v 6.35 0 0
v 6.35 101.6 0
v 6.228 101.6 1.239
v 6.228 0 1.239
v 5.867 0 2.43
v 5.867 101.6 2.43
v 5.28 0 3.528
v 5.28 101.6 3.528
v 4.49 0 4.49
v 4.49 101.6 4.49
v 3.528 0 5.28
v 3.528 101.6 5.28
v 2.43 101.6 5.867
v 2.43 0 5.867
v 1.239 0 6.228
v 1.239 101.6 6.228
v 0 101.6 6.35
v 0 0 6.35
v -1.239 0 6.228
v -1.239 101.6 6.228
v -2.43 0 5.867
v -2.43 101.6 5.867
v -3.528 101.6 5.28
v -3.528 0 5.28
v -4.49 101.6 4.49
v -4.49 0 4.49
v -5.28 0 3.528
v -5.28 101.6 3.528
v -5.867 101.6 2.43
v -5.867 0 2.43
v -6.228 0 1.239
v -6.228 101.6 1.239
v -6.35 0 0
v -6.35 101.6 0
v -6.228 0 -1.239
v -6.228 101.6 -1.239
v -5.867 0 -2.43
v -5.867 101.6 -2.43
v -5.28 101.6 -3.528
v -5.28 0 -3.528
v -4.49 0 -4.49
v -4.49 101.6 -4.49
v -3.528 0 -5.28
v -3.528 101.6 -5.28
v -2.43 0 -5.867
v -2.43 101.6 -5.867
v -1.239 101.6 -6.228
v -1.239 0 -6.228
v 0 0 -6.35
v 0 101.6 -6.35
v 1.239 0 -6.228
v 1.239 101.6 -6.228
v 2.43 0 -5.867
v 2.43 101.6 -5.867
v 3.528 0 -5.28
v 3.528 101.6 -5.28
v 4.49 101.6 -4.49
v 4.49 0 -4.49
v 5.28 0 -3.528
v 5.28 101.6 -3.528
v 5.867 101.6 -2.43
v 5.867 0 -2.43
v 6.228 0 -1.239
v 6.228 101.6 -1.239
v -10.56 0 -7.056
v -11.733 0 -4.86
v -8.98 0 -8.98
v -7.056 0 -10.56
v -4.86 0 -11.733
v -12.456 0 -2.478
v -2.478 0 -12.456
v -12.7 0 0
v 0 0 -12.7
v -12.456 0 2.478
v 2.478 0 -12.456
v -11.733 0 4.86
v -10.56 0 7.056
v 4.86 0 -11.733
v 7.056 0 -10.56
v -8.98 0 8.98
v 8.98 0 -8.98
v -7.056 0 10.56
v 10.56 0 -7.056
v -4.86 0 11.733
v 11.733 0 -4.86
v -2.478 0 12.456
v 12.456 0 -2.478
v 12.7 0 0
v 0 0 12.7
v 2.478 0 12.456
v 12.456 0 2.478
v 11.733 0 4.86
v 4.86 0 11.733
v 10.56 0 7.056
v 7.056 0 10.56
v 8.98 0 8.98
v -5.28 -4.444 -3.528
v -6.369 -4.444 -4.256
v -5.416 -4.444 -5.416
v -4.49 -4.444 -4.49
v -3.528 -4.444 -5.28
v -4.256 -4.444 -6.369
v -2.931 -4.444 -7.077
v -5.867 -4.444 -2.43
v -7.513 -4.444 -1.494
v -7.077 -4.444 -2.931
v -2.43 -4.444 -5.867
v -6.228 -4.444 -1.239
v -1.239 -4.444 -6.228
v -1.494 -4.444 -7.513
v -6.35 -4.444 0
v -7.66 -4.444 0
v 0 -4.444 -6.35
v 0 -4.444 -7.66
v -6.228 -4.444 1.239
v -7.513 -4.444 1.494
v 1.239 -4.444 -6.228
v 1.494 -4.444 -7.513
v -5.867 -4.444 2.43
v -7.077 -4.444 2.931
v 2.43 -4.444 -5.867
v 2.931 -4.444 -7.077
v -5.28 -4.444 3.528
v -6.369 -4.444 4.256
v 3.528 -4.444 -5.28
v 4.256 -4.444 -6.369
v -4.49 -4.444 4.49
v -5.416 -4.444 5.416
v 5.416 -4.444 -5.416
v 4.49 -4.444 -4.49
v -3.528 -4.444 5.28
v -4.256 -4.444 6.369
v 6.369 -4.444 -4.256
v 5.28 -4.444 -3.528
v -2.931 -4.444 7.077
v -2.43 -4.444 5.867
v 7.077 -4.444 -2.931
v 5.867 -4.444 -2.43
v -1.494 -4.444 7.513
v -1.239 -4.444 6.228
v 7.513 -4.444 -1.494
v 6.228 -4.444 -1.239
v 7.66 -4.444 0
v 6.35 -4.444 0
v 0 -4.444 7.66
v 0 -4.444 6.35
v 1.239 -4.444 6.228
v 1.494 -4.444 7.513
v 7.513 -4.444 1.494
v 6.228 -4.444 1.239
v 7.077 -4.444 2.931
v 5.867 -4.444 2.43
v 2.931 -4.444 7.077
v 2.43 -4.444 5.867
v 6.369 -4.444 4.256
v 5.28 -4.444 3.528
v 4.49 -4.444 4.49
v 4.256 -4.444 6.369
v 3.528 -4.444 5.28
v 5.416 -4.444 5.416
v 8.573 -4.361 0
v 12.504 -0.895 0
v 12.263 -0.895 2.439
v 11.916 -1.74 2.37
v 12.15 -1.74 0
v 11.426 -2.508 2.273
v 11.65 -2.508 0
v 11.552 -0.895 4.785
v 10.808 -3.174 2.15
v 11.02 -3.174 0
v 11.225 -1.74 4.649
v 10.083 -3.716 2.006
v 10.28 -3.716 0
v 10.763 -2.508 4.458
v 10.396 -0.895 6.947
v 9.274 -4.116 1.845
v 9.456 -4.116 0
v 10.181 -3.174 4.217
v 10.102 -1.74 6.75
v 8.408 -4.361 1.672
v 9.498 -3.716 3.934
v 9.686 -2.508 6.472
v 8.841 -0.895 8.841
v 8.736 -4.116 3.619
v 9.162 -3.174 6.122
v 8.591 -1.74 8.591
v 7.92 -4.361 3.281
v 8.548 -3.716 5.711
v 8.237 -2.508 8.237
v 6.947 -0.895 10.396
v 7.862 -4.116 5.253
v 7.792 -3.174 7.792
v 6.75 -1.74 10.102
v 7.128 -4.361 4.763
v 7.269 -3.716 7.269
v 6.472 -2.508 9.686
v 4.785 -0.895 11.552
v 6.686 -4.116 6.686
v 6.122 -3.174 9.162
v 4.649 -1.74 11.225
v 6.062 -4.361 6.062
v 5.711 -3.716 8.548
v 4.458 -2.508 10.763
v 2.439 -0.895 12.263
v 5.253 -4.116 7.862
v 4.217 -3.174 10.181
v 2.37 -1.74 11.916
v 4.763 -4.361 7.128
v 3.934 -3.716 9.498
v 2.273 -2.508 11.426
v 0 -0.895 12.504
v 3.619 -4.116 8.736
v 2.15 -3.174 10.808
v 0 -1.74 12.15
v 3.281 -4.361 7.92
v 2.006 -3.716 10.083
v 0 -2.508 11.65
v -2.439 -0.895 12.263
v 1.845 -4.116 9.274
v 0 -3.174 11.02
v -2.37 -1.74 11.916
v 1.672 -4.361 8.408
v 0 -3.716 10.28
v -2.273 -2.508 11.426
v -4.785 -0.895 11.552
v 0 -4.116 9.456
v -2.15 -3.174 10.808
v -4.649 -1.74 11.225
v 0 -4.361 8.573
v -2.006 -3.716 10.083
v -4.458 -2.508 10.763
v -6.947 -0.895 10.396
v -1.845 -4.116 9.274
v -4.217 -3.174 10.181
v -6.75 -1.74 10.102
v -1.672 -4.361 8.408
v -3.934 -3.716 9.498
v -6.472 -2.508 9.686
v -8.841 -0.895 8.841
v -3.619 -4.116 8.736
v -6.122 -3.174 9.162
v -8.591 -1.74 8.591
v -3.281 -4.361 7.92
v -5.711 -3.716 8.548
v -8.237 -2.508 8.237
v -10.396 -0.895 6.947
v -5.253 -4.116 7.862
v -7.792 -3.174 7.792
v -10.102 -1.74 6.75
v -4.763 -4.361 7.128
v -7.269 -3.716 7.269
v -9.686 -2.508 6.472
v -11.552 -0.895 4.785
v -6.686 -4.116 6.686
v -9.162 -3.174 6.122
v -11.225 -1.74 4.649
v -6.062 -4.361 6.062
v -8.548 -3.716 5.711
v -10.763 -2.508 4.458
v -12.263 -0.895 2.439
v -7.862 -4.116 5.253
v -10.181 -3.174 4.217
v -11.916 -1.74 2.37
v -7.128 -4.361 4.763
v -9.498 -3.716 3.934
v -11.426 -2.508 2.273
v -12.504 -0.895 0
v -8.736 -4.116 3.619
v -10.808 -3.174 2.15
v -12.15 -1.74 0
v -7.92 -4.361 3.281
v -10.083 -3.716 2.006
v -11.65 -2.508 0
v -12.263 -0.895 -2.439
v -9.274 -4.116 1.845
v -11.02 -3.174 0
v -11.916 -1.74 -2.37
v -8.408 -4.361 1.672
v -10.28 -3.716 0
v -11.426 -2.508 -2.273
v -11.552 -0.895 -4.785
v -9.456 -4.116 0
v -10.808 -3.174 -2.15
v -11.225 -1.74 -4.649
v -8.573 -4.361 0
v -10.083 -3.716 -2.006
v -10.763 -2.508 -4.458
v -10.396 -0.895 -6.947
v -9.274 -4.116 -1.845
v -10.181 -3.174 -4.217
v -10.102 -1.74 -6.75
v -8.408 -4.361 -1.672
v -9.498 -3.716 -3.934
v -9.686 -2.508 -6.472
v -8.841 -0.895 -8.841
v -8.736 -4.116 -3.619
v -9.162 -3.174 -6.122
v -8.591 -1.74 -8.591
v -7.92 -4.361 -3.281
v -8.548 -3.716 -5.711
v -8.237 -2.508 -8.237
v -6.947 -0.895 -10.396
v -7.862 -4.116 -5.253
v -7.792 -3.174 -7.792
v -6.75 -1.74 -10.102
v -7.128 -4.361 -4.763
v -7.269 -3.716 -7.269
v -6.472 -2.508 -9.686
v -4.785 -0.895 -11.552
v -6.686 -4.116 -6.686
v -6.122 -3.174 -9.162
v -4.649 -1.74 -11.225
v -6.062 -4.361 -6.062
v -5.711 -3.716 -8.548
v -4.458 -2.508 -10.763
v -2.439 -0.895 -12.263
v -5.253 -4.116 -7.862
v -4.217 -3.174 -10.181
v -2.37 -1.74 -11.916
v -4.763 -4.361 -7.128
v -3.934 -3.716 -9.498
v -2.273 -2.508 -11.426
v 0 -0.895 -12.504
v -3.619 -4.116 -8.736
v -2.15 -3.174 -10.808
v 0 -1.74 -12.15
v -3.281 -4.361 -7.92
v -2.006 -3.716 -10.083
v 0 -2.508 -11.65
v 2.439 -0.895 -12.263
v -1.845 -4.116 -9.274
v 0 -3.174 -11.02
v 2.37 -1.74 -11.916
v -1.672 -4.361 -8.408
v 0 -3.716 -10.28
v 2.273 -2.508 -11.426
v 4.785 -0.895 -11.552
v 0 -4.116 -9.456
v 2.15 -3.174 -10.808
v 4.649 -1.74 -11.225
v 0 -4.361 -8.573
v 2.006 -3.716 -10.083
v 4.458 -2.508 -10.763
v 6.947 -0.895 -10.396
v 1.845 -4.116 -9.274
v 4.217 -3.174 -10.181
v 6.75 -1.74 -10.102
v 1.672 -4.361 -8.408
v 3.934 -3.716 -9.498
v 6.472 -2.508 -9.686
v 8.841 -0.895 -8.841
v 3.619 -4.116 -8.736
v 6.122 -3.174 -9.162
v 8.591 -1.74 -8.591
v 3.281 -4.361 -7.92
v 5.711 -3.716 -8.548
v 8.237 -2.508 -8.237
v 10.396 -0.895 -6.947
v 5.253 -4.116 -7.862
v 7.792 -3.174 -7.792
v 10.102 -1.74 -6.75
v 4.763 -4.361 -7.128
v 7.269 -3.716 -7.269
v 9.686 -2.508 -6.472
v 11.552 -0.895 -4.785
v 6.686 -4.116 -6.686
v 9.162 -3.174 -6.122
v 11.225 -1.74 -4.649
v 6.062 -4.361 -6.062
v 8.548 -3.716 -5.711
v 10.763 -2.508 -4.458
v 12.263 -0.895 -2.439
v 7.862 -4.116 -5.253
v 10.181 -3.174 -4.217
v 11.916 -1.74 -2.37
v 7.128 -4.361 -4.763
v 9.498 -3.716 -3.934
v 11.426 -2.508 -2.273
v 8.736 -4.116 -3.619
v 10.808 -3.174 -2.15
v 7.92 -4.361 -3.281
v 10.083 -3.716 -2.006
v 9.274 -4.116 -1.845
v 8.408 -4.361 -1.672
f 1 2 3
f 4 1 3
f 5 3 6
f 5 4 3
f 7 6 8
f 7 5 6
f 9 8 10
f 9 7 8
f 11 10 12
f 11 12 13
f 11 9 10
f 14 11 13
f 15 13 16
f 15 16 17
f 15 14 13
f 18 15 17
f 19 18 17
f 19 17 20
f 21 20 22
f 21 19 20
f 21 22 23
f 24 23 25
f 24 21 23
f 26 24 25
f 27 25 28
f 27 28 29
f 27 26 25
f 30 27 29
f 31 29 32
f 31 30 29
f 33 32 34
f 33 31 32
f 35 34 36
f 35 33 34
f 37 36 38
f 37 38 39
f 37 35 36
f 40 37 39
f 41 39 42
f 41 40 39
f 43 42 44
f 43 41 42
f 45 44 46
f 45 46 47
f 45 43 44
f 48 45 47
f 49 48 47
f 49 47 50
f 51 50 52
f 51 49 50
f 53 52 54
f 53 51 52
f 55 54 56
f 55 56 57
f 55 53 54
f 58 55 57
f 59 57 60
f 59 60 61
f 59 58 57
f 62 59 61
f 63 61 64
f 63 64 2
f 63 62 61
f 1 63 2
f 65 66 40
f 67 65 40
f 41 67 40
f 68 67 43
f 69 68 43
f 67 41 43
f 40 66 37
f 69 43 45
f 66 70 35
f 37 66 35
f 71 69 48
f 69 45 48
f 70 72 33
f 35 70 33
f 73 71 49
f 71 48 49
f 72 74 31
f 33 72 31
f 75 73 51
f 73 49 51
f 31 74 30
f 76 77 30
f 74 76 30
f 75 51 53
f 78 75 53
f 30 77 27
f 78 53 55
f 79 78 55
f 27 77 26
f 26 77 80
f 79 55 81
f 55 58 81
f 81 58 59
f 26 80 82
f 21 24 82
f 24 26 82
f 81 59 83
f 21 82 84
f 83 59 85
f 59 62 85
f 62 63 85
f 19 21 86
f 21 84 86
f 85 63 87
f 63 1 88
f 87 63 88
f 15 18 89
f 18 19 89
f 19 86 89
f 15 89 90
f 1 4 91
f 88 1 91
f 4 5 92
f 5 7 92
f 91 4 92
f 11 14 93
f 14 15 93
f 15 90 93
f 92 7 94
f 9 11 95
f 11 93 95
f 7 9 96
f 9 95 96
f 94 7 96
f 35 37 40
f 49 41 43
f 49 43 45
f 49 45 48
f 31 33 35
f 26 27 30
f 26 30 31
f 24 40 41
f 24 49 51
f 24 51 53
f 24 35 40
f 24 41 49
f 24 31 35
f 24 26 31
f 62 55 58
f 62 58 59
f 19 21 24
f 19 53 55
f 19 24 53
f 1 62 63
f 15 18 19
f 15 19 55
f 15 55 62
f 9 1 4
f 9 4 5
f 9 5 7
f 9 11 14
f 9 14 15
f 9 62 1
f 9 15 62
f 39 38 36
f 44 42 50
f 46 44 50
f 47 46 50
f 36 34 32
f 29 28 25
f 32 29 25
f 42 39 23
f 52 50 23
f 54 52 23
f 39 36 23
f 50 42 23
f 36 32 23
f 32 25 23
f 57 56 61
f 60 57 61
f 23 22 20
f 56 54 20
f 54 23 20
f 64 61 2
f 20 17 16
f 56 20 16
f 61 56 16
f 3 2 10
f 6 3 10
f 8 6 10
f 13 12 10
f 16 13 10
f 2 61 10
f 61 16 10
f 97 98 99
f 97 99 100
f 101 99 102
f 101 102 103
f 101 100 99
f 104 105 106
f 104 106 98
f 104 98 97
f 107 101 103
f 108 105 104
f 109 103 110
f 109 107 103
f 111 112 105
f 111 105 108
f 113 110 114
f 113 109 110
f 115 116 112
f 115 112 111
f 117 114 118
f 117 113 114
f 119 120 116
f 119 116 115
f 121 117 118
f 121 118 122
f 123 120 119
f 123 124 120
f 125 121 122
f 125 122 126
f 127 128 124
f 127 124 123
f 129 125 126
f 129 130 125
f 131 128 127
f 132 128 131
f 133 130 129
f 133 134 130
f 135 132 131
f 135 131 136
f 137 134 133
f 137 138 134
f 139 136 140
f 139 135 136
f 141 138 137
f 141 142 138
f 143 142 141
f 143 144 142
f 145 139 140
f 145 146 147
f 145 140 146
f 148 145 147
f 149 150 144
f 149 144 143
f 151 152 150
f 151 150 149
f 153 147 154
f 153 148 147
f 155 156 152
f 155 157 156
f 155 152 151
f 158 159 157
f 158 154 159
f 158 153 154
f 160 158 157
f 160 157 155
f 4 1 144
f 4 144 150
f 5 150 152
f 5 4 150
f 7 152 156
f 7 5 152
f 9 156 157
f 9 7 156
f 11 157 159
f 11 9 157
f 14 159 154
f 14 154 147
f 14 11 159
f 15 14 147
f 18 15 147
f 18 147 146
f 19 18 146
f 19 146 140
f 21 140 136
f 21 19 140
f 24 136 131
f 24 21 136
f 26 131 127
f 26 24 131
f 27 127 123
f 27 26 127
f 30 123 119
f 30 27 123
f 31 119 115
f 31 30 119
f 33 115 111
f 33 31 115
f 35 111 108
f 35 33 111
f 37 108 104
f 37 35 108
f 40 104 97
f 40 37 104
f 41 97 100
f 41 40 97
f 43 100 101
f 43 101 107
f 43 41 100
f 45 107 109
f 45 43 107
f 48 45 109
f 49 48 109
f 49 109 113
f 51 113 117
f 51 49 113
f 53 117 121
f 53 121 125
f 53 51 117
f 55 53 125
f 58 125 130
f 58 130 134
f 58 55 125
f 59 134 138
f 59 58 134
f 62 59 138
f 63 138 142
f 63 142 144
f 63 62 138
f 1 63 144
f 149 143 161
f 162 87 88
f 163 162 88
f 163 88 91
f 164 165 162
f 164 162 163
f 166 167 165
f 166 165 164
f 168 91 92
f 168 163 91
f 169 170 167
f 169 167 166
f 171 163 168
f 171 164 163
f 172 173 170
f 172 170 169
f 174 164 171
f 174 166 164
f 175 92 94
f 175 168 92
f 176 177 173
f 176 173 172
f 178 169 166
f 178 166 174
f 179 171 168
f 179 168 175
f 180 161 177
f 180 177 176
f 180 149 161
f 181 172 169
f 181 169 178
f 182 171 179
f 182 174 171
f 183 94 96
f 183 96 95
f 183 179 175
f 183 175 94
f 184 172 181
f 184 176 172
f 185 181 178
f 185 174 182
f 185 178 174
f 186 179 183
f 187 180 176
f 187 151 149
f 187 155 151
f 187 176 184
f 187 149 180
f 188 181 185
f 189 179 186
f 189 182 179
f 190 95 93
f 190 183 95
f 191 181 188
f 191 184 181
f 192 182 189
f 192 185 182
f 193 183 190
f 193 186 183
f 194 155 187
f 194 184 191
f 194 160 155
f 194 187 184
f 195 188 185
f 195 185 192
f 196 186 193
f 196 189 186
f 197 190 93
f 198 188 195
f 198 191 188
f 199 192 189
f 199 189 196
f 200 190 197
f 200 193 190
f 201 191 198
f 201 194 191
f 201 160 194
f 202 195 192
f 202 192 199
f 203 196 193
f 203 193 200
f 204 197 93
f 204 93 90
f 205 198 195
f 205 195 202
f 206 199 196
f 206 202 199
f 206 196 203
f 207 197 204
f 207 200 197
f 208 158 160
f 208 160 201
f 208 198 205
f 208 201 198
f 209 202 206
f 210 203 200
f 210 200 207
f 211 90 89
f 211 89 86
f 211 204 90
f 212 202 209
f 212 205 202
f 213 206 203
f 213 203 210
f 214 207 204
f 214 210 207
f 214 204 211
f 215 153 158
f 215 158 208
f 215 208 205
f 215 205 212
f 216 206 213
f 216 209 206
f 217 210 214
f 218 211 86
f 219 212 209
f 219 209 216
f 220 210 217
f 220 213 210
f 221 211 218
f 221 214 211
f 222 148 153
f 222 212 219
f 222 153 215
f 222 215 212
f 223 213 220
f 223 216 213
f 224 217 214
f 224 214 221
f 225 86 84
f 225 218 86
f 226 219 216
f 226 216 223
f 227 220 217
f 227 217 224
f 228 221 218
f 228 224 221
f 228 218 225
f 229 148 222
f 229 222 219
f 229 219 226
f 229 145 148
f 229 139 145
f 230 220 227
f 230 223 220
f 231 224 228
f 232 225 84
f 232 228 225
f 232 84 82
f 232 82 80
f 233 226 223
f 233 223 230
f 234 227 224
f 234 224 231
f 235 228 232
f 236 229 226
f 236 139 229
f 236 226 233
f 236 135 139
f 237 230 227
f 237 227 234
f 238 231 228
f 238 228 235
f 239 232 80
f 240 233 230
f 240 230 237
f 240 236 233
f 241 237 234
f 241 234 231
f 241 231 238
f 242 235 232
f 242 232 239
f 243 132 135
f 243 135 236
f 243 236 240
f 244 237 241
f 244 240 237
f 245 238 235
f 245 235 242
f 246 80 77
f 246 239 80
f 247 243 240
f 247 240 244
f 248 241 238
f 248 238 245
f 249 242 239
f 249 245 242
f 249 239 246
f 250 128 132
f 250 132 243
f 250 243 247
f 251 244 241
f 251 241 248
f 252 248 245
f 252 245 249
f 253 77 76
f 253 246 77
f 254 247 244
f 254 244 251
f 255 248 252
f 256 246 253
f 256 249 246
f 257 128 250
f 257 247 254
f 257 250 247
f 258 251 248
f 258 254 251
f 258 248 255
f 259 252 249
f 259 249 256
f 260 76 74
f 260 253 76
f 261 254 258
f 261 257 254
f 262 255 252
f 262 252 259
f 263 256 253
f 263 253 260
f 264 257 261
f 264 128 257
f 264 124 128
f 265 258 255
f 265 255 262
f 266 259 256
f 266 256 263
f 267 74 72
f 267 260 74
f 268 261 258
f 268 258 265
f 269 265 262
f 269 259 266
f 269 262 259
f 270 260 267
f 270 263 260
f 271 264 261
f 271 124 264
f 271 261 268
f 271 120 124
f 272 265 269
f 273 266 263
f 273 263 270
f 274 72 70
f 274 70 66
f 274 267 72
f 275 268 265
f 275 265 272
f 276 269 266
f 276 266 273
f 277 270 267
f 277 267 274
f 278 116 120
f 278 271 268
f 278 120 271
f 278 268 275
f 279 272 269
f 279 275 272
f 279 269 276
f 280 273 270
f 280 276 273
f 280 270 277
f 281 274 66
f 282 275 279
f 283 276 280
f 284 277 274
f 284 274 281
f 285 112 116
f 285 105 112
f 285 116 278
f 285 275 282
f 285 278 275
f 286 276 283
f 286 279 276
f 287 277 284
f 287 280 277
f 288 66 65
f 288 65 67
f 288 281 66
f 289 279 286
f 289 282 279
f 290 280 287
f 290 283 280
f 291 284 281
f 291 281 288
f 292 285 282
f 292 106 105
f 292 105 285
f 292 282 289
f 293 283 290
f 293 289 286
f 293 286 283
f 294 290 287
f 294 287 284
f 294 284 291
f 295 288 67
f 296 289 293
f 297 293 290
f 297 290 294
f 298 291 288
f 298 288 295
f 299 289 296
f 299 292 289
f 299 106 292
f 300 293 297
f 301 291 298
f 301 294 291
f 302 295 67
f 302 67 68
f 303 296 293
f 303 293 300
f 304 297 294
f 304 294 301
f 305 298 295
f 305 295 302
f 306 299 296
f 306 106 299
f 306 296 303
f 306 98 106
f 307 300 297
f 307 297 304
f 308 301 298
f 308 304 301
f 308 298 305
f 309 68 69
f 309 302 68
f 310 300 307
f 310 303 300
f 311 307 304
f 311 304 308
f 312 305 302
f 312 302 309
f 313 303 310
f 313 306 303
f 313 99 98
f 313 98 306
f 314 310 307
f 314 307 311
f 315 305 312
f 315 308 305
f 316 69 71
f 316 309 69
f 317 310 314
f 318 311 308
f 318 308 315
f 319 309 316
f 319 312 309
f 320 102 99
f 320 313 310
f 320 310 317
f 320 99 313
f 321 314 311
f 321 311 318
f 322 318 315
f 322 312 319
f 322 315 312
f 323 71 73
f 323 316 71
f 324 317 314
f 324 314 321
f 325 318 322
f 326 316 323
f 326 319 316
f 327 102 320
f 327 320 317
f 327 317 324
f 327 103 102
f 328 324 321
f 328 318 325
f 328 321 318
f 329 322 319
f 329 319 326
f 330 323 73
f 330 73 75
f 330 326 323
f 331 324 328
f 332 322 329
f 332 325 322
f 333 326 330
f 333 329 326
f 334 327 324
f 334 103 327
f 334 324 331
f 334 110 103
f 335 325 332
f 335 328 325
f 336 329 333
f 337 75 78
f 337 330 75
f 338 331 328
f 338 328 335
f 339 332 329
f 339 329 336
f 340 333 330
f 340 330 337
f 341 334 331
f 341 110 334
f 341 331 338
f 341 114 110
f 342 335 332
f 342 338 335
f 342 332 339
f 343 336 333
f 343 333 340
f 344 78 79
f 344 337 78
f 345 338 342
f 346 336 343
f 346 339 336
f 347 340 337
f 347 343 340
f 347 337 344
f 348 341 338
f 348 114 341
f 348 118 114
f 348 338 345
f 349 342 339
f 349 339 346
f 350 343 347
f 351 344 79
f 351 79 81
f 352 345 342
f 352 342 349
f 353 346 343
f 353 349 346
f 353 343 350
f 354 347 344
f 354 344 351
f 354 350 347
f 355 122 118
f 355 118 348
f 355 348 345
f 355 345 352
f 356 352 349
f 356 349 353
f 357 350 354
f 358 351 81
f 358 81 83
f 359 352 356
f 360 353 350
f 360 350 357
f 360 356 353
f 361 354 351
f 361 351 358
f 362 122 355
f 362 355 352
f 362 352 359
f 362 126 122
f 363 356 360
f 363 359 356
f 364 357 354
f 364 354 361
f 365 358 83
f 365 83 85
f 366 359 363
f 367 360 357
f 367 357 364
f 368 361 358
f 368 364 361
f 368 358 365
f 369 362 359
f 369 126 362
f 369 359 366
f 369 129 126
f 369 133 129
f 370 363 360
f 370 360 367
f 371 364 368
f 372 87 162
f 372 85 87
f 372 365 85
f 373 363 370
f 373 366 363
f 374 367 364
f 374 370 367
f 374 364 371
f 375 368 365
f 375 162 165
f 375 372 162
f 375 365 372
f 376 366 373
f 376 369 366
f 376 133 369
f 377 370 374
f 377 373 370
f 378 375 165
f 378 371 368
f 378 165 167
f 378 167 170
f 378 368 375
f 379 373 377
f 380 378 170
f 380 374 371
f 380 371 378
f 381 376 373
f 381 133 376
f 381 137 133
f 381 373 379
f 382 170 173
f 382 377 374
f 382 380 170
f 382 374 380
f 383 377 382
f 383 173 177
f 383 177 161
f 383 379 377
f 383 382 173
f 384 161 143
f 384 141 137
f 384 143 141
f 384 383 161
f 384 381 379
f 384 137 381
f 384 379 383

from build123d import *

# Parameters (mm, degrees)
F0_R     = 12.7
F0_R_2   = 6.35
F1_DEPTH = 4.4436082244
F3_R     = 6.35
F4_DEPTH = 101.6


# Not quite as in the source:
# - a fillet or chamfer that OpenCascade refuses, or shapes differently, is made with other operations: its cross-section is extruded or revolved along the edge and cut away or added


with BuildPart() as f1:
    # F0 (on Front) → F1 (new body)
    with BuildSketch(Plane.XZ):
        Circle(F0_R)
        Circle(F0_R_2, mode=Mode.SUBTRACT)
    extrude(amount=F1_DEPTH)

    # F2: fillet of radius 5.08 on 1 edges, made by hand

    # F2_s1 → F2_t2 (revolve, cut)
    with BuildSketch(Plane.XY):
        with BuildLine():
            ThreePointArc((12.7, 0), (11.019597377, -3.1740721214), (7.6600192949, -4.4436082244))
            Line((7.6600192949, -4.4436082244), (12.7, -4.4436082244))
            Line((12.7, -4.4436082244), (12.7, 0))
        make_face()
    revolve(axis=Axis((0, -4.4436082244, 0), (0, -1, 0)), mode=Mode.SUBTRACT)


with BuildPart() as f4:
    # F3 (on Front) → F4 (new body)
    with BuildSketch(Plane.XZ):
        Circle(F3_R)
    extrude(amount=-F4_DEPTH)


solid = Compound([f1.part, f4.part])
